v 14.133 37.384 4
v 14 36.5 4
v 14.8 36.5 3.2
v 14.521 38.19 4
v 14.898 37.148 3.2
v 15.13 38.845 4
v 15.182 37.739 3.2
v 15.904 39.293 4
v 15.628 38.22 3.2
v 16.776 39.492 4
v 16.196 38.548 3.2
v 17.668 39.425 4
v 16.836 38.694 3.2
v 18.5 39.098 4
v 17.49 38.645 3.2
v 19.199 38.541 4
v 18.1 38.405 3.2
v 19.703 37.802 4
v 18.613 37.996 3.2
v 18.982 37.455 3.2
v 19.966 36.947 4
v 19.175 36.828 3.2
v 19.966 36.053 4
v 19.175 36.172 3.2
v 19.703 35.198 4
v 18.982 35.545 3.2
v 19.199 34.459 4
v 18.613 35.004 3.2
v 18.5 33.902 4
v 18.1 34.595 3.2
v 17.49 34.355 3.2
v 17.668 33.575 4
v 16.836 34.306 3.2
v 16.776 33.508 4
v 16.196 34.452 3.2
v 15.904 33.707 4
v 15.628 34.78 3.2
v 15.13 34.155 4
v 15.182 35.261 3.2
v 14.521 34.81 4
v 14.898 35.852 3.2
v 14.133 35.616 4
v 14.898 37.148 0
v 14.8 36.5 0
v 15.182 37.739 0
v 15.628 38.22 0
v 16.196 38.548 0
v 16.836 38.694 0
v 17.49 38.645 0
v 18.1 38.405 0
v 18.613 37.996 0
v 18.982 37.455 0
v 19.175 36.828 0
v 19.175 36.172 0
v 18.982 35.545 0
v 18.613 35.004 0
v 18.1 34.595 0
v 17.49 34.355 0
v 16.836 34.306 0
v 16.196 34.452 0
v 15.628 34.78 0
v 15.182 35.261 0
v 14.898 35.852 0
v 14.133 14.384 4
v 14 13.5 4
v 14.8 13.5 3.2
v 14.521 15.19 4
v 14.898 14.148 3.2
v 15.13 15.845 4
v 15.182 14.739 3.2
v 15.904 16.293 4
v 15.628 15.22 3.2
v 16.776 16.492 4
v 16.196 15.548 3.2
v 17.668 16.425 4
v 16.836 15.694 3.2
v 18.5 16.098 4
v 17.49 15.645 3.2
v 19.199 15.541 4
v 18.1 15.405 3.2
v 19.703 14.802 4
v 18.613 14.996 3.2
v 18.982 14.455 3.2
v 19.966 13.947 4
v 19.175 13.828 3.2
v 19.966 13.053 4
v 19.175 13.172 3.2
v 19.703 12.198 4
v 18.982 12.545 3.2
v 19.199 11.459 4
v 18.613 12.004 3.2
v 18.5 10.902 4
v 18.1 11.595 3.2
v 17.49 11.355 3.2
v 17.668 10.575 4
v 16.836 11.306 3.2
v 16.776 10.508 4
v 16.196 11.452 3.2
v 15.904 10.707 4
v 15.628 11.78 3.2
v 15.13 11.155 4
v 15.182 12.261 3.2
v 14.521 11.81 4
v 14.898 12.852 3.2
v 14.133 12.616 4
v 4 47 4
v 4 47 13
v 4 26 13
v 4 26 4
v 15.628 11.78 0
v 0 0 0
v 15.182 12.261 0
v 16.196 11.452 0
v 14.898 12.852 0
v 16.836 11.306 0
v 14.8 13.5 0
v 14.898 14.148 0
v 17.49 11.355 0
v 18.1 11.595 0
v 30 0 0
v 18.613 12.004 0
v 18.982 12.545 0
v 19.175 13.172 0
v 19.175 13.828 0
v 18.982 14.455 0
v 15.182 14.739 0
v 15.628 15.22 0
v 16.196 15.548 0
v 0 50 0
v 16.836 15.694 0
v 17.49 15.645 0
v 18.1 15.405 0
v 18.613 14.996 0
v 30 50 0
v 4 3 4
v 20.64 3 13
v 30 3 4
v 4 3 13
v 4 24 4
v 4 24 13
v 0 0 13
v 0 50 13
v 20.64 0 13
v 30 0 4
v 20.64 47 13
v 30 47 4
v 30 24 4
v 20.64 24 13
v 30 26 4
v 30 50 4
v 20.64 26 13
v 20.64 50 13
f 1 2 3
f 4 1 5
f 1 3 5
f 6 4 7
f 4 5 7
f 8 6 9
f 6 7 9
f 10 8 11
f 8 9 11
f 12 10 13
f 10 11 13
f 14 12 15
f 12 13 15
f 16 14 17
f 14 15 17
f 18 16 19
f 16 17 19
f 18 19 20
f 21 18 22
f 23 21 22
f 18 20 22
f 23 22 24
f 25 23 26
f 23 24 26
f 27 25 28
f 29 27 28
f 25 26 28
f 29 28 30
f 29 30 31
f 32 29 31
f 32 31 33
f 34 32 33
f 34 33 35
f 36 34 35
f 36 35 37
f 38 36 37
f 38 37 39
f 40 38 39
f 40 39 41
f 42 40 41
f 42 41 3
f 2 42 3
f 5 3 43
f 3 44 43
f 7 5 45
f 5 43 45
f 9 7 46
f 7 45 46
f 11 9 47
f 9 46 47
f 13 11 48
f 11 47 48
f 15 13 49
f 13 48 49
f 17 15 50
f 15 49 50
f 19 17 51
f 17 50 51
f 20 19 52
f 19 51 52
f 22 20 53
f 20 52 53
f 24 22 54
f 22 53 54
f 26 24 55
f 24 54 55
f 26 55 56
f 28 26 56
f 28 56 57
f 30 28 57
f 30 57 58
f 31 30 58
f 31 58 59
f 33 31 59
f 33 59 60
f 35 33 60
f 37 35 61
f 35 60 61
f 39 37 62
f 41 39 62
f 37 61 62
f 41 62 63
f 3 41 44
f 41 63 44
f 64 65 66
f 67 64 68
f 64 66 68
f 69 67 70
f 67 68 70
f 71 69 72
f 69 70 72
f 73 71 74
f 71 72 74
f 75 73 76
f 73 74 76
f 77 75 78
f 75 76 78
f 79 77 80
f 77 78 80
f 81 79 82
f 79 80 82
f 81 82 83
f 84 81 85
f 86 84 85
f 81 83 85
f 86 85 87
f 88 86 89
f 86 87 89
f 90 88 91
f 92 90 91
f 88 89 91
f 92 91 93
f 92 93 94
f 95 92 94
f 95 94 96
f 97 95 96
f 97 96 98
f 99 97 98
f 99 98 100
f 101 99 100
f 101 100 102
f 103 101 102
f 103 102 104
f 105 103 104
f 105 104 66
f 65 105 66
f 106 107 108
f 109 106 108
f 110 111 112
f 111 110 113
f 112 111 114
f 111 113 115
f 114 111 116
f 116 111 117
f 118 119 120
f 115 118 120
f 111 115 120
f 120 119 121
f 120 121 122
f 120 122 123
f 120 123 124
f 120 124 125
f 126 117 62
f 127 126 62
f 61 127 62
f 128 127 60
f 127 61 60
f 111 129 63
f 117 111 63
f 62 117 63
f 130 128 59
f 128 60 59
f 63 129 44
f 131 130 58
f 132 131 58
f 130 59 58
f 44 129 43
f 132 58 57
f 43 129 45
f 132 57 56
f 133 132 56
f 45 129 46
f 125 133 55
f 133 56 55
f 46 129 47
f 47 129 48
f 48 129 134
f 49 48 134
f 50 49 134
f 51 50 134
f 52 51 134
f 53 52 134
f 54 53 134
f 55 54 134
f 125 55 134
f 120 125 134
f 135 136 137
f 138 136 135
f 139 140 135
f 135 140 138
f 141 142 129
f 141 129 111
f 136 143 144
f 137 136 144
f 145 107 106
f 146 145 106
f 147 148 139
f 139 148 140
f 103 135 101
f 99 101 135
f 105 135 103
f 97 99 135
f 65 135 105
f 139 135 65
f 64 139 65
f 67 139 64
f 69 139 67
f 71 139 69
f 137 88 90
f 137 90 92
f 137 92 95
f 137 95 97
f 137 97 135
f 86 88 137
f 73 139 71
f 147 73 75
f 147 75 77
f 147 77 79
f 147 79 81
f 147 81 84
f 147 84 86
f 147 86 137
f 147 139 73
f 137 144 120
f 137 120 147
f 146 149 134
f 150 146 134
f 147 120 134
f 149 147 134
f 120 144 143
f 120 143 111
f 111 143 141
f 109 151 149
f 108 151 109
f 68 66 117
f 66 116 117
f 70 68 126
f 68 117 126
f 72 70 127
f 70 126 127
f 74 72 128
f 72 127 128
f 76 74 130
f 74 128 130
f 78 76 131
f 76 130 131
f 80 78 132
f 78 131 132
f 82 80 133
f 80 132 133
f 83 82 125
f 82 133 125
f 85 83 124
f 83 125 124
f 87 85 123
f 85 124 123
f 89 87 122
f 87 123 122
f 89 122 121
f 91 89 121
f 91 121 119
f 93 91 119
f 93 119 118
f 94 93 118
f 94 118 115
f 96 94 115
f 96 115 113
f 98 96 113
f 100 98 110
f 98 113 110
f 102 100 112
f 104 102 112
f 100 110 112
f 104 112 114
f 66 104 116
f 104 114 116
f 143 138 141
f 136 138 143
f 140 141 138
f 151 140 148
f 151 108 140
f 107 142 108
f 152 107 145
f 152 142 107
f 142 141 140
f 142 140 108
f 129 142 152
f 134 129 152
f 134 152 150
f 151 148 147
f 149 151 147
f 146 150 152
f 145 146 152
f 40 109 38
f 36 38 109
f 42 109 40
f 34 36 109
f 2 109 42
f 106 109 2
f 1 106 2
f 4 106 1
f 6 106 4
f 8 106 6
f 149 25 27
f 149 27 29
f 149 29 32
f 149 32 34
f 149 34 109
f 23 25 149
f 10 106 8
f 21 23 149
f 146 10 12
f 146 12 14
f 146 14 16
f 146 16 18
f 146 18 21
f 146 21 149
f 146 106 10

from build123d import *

# Parameters (mm, degrees)
SKETCH011_W         = 30
SKETCH011_H         = 50
PAD009_DEPTH        = 4
SKETCH007_W         = 50
SKETCH007_H         = 25
PAD006_DEPTH        = 4
PAD007_DEPTH        = 3
PAD005_DEPTH        = 1
PAD008_DEPTH        = 3
HOLE001_D           = 4.4
HOLE001_DEPTH       = 25
HOLE001_CSINK_D     = 8
HOLE001_CSINK_ANGLE = 90
SKETCH012_W         = 40.900608
SKETCH012_H         = 56.513194
POCKET_DEPTH        = 25


with BuildPart() as part:
    # Sketch011 → Pad009 (new body)
    with BuildSketch(Plane.XY):
        with Locations((15, 25)):
            Rectangle(SKETCH011_W, SKETCH011_H)
    extrude(amount=PAD009_DEPTH)

    # Sketch007 → Pad006 (join)
    with BuildSketch(Plane(origin=(0, 0, 0), x_dir=(0, -1, 0), z_dir=(-1, 0, 0))):
        with Locations((-25, 16.5)):
            Rectangle(SKETCH007_W, SKETCH007_H)
    extrude(amount=-PAD006_DEPTH)

    # Sketch008 → Pad007 (join)
    with BuildSketch(Plane.XZ):
        Polygon((4, 4), (4, 29), (30, 4), align=None)
    extrude(amount=-PAD007_DEPTH)

    # Sketch009 → Pad005 (join, symmetric)
    with BuildSketch(Plane.XZ.offset(-25)):
        Polygon((4, 4), (4, 29), (30, 4), align=None)
    extrude(amount=PAD005_DEPTH, both=True)

    # Sketch006 → Pad008 (join)
    with BuildSketch(Plane.XZ.offset(-50)):
        Polygon((4, 29), (4, 4), (30, 4), align=None)
    extrude(amount=PAD008_DEPTH)

    # Hole001
    with Locations(Plane.XY.offset(5)):
        with Locations((17, 36.5), (17, 13.5)):
            CounterSinkHole(HOLE001_D / 2, HOLE001_CSINK_D / 2, depth=HOLE001_DEPTH, counter_sink_angle=HOLE001_CSINK_ANGLE)

    # Sketch012 → Pocket (cut)
    with BuildSketch(Plane.XY.offset(13)):
        with Locations((14.816534, 25.266581)):
            Rectangle(SKETCH012_W, SKETCH012_H)
    extrude(amount=POCKET_DEPTH, mode=Mode.SUBTRACT)


solid = part.part
